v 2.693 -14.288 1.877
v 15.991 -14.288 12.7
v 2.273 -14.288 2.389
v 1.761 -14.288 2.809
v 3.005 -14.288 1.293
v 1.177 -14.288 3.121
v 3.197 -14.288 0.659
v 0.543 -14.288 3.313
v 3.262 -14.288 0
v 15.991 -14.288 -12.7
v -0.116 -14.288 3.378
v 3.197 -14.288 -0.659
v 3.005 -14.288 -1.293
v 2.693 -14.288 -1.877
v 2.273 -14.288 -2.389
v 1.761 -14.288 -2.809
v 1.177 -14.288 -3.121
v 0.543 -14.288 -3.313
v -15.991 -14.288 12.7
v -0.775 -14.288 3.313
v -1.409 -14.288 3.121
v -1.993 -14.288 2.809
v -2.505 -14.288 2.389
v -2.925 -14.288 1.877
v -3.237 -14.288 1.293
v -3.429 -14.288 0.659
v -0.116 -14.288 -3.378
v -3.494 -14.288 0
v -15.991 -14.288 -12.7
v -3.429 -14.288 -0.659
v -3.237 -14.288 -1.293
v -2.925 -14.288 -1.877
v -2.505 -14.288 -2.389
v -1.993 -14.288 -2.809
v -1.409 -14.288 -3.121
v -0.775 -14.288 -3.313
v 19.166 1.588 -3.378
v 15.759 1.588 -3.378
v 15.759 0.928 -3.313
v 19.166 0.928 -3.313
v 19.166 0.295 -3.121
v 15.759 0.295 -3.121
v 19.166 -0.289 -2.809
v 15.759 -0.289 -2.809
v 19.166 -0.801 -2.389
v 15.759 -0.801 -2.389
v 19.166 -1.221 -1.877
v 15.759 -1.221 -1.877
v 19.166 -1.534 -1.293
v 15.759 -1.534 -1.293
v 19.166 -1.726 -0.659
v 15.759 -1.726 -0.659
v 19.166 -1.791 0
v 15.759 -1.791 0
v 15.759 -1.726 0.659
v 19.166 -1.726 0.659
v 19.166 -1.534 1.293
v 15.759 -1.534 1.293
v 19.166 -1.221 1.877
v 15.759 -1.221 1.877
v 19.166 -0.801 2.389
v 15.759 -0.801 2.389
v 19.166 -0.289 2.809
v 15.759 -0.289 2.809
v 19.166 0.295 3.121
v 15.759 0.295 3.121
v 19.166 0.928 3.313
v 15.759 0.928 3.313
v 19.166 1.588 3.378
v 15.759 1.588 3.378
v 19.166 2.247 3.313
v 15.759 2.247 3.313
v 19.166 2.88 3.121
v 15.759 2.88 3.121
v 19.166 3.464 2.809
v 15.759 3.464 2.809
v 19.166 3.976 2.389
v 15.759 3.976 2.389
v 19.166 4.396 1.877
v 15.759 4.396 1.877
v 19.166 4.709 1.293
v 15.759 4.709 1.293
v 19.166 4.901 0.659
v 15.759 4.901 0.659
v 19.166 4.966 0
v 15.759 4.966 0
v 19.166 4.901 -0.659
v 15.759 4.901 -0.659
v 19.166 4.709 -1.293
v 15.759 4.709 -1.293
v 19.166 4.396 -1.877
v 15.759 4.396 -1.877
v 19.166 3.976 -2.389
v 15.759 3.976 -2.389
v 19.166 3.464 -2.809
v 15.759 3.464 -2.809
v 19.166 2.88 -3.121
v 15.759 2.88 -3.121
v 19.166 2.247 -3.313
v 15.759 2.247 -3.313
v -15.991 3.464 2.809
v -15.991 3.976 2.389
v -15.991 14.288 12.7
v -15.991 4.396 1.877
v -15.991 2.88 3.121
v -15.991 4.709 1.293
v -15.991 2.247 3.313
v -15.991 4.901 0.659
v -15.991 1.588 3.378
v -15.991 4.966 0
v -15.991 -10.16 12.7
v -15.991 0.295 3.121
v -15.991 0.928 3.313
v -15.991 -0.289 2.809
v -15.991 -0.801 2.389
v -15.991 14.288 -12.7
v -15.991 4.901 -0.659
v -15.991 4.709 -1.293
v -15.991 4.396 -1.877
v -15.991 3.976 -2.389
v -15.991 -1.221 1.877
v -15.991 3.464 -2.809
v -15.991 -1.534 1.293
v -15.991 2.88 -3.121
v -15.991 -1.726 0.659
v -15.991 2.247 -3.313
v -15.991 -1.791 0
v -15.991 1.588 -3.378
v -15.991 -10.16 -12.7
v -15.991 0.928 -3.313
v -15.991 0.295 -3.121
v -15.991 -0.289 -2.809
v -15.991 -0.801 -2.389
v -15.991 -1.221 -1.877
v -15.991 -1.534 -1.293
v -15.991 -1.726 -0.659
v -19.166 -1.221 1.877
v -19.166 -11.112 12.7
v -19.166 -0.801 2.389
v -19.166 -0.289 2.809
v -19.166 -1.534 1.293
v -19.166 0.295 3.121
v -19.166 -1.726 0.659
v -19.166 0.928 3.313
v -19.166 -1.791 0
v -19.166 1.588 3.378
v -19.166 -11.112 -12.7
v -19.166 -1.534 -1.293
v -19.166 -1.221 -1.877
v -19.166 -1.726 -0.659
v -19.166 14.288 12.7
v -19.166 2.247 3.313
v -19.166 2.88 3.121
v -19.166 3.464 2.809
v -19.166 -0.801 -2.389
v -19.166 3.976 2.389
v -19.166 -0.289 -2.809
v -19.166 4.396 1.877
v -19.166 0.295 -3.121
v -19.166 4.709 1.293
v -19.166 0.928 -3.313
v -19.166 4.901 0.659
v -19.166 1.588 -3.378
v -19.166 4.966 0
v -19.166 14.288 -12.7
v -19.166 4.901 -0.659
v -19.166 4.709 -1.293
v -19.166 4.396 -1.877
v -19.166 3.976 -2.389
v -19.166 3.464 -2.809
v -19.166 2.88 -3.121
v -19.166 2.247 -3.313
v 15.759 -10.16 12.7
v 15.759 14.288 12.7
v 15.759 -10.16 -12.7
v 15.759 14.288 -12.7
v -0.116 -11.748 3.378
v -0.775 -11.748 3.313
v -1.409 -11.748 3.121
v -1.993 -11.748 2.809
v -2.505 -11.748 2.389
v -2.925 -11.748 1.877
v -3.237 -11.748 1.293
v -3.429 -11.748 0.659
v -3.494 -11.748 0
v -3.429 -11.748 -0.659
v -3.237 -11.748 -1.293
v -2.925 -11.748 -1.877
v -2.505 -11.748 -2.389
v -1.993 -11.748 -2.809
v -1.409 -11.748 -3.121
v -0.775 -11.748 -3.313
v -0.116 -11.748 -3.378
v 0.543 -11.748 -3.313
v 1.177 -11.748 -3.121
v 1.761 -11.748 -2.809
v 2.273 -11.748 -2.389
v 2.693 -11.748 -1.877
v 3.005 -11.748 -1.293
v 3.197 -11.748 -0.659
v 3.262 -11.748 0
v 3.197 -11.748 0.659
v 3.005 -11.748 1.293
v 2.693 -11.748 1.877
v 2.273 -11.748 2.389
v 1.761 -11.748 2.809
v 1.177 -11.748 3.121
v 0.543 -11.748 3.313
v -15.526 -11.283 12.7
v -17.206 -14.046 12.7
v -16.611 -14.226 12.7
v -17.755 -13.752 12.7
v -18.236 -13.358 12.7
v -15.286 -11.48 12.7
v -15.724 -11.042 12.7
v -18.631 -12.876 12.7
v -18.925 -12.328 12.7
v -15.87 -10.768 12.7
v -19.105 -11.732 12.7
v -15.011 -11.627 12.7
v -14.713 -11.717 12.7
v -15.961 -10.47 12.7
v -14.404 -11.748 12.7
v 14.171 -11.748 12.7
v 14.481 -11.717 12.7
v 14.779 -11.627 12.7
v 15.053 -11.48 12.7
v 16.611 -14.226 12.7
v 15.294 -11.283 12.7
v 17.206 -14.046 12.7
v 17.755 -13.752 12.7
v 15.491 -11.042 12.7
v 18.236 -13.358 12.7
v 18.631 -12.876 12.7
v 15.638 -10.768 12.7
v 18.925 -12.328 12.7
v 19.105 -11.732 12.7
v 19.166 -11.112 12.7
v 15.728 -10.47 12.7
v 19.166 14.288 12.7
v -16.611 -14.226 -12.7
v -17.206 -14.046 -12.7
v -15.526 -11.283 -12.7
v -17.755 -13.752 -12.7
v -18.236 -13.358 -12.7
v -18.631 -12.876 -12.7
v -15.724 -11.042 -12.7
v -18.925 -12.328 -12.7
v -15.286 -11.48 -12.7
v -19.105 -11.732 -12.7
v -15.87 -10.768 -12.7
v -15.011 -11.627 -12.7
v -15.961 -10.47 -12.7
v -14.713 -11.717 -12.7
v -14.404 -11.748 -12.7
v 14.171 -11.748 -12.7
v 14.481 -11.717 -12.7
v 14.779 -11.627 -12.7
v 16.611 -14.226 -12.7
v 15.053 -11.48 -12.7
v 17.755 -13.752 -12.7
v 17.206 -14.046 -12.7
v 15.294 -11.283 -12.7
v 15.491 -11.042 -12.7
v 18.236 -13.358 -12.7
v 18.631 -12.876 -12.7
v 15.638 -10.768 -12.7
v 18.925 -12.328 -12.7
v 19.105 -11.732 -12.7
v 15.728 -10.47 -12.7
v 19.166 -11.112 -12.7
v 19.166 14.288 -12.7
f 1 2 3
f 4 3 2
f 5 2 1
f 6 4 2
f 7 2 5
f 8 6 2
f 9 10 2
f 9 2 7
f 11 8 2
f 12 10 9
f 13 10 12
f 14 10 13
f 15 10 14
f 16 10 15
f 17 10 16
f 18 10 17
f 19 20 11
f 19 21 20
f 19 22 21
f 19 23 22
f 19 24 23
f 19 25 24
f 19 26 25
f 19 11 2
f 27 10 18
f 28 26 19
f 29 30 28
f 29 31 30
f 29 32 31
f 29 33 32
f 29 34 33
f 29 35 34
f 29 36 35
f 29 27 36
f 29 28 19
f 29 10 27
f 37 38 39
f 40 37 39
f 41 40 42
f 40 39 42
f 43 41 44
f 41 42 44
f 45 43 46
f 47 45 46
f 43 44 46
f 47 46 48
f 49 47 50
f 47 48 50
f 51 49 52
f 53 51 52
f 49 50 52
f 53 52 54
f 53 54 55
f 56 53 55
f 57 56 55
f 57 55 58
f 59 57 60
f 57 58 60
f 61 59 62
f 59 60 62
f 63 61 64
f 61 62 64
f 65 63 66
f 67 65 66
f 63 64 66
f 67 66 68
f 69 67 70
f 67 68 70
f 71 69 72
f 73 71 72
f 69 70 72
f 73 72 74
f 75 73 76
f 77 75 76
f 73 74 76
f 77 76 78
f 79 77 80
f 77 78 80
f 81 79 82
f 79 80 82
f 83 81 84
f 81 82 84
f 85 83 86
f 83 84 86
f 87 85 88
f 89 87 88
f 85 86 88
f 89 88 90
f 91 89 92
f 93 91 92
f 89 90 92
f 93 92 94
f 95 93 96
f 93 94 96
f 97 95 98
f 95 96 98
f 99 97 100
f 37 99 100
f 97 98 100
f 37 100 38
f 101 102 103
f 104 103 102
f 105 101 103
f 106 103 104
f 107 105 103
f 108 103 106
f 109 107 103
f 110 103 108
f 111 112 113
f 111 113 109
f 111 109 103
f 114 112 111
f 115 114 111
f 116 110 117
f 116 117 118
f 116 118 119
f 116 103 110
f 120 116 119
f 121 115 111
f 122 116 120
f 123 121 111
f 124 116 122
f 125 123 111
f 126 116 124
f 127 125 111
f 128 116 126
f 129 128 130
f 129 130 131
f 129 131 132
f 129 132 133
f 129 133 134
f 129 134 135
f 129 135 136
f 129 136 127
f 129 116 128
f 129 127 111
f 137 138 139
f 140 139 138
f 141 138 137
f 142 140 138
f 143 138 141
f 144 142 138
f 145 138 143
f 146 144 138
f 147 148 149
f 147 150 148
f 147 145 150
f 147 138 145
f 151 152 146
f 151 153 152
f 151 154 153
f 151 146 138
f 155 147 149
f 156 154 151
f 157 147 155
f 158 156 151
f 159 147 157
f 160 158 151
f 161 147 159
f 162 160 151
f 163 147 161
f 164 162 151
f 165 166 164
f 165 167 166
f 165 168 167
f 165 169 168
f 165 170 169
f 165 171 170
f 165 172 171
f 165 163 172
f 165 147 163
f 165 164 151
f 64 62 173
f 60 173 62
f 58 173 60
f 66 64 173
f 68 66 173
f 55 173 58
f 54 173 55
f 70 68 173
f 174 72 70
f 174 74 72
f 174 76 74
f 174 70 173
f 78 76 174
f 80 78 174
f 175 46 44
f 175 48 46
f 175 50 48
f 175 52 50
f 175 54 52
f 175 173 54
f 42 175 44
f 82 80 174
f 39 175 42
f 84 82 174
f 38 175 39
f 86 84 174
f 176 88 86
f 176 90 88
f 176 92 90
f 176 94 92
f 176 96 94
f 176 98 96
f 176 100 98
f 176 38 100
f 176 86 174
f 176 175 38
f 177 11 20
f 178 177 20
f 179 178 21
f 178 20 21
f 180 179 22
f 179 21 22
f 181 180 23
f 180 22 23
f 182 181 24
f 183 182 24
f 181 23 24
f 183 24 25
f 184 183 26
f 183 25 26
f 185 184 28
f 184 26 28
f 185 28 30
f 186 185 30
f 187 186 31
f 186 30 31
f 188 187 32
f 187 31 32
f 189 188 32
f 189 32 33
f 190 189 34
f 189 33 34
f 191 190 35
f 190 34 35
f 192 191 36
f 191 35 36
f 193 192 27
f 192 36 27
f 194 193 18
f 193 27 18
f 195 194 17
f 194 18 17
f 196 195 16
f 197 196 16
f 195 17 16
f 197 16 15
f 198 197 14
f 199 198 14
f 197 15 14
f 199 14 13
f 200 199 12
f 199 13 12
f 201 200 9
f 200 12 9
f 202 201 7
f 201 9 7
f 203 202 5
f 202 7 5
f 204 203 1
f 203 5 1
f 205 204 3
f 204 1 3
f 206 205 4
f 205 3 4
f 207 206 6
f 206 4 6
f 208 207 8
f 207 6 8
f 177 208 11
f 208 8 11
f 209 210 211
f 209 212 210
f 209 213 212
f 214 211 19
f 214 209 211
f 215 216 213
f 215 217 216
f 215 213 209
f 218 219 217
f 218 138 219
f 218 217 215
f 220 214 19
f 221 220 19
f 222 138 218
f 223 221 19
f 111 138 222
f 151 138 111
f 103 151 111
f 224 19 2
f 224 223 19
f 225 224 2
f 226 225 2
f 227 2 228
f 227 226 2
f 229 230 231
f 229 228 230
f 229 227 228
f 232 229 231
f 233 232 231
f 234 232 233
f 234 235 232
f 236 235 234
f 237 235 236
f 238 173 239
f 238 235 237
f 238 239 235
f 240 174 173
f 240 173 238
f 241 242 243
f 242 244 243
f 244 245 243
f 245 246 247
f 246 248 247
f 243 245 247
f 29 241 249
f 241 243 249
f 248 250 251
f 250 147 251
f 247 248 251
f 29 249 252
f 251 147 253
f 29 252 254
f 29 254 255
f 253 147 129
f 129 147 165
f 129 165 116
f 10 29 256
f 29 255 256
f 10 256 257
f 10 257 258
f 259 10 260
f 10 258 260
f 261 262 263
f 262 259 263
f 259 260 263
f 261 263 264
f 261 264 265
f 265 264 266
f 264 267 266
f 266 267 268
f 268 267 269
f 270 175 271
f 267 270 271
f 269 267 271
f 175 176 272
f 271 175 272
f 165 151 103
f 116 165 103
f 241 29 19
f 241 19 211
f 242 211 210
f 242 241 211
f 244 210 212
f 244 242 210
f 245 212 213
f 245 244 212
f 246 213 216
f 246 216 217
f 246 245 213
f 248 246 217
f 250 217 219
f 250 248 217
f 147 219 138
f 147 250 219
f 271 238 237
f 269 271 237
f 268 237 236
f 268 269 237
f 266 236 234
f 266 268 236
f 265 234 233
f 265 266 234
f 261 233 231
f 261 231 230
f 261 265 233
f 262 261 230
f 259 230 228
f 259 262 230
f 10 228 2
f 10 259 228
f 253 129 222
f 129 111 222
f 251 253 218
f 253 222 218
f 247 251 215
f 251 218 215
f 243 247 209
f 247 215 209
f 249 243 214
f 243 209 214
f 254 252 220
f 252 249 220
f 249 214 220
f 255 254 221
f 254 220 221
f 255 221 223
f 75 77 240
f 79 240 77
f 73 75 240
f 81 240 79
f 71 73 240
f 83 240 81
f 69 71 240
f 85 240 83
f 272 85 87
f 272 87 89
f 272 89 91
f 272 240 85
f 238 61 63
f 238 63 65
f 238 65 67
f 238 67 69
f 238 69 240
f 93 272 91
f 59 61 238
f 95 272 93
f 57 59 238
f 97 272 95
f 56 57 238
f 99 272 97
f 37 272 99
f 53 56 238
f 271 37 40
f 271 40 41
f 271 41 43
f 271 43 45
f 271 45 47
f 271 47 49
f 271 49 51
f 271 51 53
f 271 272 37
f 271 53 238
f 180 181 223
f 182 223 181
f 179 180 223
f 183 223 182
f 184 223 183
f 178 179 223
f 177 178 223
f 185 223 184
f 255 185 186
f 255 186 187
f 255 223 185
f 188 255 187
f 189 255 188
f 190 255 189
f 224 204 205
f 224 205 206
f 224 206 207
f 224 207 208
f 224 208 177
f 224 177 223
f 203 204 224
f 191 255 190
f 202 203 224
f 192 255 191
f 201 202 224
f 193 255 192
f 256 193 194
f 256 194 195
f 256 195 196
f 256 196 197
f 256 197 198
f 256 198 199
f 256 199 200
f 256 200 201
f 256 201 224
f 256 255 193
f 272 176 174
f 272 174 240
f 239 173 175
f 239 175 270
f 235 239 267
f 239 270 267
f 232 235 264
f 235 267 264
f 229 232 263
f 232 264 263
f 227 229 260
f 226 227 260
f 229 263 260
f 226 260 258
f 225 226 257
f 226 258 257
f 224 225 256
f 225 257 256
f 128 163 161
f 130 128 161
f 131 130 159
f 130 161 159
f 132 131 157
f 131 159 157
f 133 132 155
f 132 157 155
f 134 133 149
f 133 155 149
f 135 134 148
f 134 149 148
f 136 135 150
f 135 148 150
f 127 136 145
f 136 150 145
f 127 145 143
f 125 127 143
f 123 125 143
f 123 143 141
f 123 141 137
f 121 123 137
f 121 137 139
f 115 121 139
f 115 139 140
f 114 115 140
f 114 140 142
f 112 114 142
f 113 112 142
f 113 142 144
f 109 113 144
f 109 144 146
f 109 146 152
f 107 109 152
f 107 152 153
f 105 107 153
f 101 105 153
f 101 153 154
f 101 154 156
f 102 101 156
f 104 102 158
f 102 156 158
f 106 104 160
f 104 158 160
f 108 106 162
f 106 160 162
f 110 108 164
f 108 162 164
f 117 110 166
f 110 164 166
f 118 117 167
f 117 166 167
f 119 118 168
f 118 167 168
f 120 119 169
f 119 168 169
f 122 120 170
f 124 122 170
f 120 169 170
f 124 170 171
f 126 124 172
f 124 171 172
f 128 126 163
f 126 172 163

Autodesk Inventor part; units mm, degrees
ref_plane "YZ Plane" through (0, 0, 0) normal (1, 0, 0) x (0, 1, 0)
ref_plane "XZ Plane" through (0, 0, 0) normal (0, 1, 0) x (-1, 0, 0)
ref_plane "XY Plane" through (0, 0, 0) normal (0, 0, 1) x (1, 0, 0)
sketch "Sketch1" plane through (0, 0, 0) normal (0, 0, 1) x (1, 0, 0)
  line L0 (-15.9912, -11.7475) -> (15.7588, -11.7475)
  line L1 (15.7588, -11.7475) -> (15.7588, 14.2875)
  line L2 (-15.9912, 14.2875) -> (-15.9912, -11.7475)
  line L3 (-15.9912, -11.7475) -> (15.7588, 11.5768) construction
  line L4 (15.7588, -11.7475) -> (-15.9912, 11.9207) construction
  line L5 (19.1662, -14.2875) -> (-19.1662, -14.2875)
  line L6 (-19.1662, -14.2875) -> (-19.1662, 14.2875)
  line L7 (19.1662, 14.2875) -> (19.1662, -14.2875)
  line L8 (19.1662, -14.2875) -> (-19.1662, 14.2875) construction
  line L9 (-19.1662, -14.2875) -> (19.1662, 14.2875) construction
  line L10 (-19.1662, 14.2875) -> (-15.9912, 14.2875)
  line L11 (15.7588, 14.2875) -> (19.1662, 14.2875)
  point P0 (0, 0)
  dimension "d2" = 3.175
  dimension "d3" = 28.575
  dimension "d4" = 31.75
  dimension "d5" = 2.54
extrude "Extrusion1" add sketch "Sketch1" along normal mid plane 25.4
sketch "Sketch2" plane through (19.1662, 14.2875, 12.7) normal (1, 0, 0) x (0, 0, -1)
  line L0 (0, 0) -> (25.4, 0) projected
  point P0 (12.7, -14.2875)
  point P1 (12.7, -12.7)
  dimension "d9" = 12.7
hole "Hole1" at (19.1662, 1.5875, 0) direction (-1, 0, 0) diameter 6.7564 end through all clearance for "Flat Head Machine Screw (82)" size "1/4" standard "Ansi Unified Screw Threads"
sketch "Sketch3" plane through (-15.9912, -11.7475, 12.7) normal (0, 1, 0) x (1, 0, 0)
  line L0 (0, 25.4) -> (0, 0) projected
  line L1 (0, 25.4) -> (31.75, 25.4) projected
  point P0 (15.875, 12.7)
  point P1 (15.875, 12.7)
  dimension "d26" = 12.7
  dimension "d27" = 15.875
hole "Hole2" at (-0.1162, -11.7475, 0) direction (0, -1, 0) diameter 6.7564 end through all clearance for "Flat Head Machine Screw (82)" size "1/4" standard "Ansi Unified Screw Threads"
fillet "Fillet2" radius 3.175 2 edges at (-19.1662, -14.2875, 0) (19.1662, -14.2875, 0)
fillet "Fillet3" radius 1.5875 2 edges at (-15.9912, -11.7475, 0) (15.7588, -11.7475, 0)
sketch "Sketch4" plane through (-19.1662, 14.2875, -12.7) normal (-1, 0, 0) x (0, 0, 1)
  circle A0 centre (12.7, -12.7) radius 3.3782 projected
  circle A1 centre (12.7, -12.7) radius 728.218
  line L0 (723.9, -1.1049) -> (723.9, 7.4549) projected
  circle A2 centre (653.833, 332.6257) radius 3.5687 projected
  point P0 (12.7, -14.2875)
  point P1 (723.9, 143.812)
properties part number "C19_TK_ClimberingSupportBracket" material "Aluminum 6061"
